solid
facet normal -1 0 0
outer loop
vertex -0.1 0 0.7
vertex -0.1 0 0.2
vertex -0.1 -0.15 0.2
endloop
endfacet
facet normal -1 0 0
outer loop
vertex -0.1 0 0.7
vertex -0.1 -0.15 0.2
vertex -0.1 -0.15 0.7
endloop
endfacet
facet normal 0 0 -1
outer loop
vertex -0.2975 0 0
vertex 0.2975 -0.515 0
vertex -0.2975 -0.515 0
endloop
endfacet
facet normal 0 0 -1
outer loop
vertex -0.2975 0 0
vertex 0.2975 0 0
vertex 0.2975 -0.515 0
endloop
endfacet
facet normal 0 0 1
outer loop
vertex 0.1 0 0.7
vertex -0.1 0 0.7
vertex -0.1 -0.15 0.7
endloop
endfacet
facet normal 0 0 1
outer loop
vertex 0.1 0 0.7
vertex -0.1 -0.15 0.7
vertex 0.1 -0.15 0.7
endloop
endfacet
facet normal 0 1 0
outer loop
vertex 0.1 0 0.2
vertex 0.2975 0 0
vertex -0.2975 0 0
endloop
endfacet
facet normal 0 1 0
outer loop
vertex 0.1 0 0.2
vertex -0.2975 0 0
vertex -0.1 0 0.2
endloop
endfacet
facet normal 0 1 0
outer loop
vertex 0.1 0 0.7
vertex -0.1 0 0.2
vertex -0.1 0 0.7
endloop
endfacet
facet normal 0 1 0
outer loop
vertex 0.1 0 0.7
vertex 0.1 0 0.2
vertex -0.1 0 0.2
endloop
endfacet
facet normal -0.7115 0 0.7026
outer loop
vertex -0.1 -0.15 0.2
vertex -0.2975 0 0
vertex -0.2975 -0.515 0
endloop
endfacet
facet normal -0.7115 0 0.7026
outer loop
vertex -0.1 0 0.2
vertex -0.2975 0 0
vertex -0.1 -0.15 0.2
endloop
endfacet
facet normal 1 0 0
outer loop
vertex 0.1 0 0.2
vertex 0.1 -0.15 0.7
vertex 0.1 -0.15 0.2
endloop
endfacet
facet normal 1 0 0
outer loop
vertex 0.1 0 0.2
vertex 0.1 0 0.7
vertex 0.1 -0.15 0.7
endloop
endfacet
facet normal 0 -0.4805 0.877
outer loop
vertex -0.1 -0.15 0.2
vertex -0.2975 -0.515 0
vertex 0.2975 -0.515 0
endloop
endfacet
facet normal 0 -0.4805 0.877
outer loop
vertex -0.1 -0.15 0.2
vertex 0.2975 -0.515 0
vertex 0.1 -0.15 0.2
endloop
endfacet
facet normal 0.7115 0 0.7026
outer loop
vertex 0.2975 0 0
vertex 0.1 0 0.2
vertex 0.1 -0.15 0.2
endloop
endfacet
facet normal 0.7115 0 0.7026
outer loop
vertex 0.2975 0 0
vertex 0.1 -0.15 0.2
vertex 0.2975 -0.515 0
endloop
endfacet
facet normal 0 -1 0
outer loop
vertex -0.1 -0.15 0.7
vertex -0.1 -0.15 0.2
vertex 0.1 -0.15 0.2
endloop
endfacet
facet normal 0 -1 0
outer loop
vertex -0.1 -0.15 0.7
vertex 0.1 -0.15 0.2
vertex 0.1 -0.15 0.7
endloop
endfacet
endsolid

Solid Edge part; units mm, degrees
sketch "Sketch1" plane through (0, 0, 0) normal (0, -1, 0) x (1, 0, 0)
  line L0 (-0.1, 0.7) -> (0.1, 0.7)
  line L1 (0.1, 0.7) -> (0.1, 0.2)
  line L2 (0.1, 0.2) -> (0.2975, 0)
  line L3 (0.2975, 0) -> (-0.2975, 0)
  line L4 (-0.2975, 0) -> (-0.1, 0.2)
  line L5 (-0.1, 0.2) -> (-0.1, 0.7)
  dimension "D1" = 0.595
  dimension "D2" = 0.2
  dimension "D3" = 0.7
  dimension "D4" = 0.2
extrude "Protrusion1" add sketch "Sketch1" along normal blind 0.515
sketch "Sketch2" plane through (0, 0, 0) normal (1, 0, 0) x (0, 1, 0)
  line L0 (-0.515, 0.7) -> (-0.15, 0.7)
  line L1 (-0.15, 0.2) -> (-0.15, 0.7)
  line L2 (-0.515, 0) -> (-0.15, 0.2)
  line L3 (-0.515, 0) -> (-0.515, 0.2)
  line L4 (-0.515, 0.2) -> (-0.515, 0.7)
  dimension "D1" = 0.15
extrude "Cutout1" cut sketch "Sketch2" along normal through all and the other way through all
